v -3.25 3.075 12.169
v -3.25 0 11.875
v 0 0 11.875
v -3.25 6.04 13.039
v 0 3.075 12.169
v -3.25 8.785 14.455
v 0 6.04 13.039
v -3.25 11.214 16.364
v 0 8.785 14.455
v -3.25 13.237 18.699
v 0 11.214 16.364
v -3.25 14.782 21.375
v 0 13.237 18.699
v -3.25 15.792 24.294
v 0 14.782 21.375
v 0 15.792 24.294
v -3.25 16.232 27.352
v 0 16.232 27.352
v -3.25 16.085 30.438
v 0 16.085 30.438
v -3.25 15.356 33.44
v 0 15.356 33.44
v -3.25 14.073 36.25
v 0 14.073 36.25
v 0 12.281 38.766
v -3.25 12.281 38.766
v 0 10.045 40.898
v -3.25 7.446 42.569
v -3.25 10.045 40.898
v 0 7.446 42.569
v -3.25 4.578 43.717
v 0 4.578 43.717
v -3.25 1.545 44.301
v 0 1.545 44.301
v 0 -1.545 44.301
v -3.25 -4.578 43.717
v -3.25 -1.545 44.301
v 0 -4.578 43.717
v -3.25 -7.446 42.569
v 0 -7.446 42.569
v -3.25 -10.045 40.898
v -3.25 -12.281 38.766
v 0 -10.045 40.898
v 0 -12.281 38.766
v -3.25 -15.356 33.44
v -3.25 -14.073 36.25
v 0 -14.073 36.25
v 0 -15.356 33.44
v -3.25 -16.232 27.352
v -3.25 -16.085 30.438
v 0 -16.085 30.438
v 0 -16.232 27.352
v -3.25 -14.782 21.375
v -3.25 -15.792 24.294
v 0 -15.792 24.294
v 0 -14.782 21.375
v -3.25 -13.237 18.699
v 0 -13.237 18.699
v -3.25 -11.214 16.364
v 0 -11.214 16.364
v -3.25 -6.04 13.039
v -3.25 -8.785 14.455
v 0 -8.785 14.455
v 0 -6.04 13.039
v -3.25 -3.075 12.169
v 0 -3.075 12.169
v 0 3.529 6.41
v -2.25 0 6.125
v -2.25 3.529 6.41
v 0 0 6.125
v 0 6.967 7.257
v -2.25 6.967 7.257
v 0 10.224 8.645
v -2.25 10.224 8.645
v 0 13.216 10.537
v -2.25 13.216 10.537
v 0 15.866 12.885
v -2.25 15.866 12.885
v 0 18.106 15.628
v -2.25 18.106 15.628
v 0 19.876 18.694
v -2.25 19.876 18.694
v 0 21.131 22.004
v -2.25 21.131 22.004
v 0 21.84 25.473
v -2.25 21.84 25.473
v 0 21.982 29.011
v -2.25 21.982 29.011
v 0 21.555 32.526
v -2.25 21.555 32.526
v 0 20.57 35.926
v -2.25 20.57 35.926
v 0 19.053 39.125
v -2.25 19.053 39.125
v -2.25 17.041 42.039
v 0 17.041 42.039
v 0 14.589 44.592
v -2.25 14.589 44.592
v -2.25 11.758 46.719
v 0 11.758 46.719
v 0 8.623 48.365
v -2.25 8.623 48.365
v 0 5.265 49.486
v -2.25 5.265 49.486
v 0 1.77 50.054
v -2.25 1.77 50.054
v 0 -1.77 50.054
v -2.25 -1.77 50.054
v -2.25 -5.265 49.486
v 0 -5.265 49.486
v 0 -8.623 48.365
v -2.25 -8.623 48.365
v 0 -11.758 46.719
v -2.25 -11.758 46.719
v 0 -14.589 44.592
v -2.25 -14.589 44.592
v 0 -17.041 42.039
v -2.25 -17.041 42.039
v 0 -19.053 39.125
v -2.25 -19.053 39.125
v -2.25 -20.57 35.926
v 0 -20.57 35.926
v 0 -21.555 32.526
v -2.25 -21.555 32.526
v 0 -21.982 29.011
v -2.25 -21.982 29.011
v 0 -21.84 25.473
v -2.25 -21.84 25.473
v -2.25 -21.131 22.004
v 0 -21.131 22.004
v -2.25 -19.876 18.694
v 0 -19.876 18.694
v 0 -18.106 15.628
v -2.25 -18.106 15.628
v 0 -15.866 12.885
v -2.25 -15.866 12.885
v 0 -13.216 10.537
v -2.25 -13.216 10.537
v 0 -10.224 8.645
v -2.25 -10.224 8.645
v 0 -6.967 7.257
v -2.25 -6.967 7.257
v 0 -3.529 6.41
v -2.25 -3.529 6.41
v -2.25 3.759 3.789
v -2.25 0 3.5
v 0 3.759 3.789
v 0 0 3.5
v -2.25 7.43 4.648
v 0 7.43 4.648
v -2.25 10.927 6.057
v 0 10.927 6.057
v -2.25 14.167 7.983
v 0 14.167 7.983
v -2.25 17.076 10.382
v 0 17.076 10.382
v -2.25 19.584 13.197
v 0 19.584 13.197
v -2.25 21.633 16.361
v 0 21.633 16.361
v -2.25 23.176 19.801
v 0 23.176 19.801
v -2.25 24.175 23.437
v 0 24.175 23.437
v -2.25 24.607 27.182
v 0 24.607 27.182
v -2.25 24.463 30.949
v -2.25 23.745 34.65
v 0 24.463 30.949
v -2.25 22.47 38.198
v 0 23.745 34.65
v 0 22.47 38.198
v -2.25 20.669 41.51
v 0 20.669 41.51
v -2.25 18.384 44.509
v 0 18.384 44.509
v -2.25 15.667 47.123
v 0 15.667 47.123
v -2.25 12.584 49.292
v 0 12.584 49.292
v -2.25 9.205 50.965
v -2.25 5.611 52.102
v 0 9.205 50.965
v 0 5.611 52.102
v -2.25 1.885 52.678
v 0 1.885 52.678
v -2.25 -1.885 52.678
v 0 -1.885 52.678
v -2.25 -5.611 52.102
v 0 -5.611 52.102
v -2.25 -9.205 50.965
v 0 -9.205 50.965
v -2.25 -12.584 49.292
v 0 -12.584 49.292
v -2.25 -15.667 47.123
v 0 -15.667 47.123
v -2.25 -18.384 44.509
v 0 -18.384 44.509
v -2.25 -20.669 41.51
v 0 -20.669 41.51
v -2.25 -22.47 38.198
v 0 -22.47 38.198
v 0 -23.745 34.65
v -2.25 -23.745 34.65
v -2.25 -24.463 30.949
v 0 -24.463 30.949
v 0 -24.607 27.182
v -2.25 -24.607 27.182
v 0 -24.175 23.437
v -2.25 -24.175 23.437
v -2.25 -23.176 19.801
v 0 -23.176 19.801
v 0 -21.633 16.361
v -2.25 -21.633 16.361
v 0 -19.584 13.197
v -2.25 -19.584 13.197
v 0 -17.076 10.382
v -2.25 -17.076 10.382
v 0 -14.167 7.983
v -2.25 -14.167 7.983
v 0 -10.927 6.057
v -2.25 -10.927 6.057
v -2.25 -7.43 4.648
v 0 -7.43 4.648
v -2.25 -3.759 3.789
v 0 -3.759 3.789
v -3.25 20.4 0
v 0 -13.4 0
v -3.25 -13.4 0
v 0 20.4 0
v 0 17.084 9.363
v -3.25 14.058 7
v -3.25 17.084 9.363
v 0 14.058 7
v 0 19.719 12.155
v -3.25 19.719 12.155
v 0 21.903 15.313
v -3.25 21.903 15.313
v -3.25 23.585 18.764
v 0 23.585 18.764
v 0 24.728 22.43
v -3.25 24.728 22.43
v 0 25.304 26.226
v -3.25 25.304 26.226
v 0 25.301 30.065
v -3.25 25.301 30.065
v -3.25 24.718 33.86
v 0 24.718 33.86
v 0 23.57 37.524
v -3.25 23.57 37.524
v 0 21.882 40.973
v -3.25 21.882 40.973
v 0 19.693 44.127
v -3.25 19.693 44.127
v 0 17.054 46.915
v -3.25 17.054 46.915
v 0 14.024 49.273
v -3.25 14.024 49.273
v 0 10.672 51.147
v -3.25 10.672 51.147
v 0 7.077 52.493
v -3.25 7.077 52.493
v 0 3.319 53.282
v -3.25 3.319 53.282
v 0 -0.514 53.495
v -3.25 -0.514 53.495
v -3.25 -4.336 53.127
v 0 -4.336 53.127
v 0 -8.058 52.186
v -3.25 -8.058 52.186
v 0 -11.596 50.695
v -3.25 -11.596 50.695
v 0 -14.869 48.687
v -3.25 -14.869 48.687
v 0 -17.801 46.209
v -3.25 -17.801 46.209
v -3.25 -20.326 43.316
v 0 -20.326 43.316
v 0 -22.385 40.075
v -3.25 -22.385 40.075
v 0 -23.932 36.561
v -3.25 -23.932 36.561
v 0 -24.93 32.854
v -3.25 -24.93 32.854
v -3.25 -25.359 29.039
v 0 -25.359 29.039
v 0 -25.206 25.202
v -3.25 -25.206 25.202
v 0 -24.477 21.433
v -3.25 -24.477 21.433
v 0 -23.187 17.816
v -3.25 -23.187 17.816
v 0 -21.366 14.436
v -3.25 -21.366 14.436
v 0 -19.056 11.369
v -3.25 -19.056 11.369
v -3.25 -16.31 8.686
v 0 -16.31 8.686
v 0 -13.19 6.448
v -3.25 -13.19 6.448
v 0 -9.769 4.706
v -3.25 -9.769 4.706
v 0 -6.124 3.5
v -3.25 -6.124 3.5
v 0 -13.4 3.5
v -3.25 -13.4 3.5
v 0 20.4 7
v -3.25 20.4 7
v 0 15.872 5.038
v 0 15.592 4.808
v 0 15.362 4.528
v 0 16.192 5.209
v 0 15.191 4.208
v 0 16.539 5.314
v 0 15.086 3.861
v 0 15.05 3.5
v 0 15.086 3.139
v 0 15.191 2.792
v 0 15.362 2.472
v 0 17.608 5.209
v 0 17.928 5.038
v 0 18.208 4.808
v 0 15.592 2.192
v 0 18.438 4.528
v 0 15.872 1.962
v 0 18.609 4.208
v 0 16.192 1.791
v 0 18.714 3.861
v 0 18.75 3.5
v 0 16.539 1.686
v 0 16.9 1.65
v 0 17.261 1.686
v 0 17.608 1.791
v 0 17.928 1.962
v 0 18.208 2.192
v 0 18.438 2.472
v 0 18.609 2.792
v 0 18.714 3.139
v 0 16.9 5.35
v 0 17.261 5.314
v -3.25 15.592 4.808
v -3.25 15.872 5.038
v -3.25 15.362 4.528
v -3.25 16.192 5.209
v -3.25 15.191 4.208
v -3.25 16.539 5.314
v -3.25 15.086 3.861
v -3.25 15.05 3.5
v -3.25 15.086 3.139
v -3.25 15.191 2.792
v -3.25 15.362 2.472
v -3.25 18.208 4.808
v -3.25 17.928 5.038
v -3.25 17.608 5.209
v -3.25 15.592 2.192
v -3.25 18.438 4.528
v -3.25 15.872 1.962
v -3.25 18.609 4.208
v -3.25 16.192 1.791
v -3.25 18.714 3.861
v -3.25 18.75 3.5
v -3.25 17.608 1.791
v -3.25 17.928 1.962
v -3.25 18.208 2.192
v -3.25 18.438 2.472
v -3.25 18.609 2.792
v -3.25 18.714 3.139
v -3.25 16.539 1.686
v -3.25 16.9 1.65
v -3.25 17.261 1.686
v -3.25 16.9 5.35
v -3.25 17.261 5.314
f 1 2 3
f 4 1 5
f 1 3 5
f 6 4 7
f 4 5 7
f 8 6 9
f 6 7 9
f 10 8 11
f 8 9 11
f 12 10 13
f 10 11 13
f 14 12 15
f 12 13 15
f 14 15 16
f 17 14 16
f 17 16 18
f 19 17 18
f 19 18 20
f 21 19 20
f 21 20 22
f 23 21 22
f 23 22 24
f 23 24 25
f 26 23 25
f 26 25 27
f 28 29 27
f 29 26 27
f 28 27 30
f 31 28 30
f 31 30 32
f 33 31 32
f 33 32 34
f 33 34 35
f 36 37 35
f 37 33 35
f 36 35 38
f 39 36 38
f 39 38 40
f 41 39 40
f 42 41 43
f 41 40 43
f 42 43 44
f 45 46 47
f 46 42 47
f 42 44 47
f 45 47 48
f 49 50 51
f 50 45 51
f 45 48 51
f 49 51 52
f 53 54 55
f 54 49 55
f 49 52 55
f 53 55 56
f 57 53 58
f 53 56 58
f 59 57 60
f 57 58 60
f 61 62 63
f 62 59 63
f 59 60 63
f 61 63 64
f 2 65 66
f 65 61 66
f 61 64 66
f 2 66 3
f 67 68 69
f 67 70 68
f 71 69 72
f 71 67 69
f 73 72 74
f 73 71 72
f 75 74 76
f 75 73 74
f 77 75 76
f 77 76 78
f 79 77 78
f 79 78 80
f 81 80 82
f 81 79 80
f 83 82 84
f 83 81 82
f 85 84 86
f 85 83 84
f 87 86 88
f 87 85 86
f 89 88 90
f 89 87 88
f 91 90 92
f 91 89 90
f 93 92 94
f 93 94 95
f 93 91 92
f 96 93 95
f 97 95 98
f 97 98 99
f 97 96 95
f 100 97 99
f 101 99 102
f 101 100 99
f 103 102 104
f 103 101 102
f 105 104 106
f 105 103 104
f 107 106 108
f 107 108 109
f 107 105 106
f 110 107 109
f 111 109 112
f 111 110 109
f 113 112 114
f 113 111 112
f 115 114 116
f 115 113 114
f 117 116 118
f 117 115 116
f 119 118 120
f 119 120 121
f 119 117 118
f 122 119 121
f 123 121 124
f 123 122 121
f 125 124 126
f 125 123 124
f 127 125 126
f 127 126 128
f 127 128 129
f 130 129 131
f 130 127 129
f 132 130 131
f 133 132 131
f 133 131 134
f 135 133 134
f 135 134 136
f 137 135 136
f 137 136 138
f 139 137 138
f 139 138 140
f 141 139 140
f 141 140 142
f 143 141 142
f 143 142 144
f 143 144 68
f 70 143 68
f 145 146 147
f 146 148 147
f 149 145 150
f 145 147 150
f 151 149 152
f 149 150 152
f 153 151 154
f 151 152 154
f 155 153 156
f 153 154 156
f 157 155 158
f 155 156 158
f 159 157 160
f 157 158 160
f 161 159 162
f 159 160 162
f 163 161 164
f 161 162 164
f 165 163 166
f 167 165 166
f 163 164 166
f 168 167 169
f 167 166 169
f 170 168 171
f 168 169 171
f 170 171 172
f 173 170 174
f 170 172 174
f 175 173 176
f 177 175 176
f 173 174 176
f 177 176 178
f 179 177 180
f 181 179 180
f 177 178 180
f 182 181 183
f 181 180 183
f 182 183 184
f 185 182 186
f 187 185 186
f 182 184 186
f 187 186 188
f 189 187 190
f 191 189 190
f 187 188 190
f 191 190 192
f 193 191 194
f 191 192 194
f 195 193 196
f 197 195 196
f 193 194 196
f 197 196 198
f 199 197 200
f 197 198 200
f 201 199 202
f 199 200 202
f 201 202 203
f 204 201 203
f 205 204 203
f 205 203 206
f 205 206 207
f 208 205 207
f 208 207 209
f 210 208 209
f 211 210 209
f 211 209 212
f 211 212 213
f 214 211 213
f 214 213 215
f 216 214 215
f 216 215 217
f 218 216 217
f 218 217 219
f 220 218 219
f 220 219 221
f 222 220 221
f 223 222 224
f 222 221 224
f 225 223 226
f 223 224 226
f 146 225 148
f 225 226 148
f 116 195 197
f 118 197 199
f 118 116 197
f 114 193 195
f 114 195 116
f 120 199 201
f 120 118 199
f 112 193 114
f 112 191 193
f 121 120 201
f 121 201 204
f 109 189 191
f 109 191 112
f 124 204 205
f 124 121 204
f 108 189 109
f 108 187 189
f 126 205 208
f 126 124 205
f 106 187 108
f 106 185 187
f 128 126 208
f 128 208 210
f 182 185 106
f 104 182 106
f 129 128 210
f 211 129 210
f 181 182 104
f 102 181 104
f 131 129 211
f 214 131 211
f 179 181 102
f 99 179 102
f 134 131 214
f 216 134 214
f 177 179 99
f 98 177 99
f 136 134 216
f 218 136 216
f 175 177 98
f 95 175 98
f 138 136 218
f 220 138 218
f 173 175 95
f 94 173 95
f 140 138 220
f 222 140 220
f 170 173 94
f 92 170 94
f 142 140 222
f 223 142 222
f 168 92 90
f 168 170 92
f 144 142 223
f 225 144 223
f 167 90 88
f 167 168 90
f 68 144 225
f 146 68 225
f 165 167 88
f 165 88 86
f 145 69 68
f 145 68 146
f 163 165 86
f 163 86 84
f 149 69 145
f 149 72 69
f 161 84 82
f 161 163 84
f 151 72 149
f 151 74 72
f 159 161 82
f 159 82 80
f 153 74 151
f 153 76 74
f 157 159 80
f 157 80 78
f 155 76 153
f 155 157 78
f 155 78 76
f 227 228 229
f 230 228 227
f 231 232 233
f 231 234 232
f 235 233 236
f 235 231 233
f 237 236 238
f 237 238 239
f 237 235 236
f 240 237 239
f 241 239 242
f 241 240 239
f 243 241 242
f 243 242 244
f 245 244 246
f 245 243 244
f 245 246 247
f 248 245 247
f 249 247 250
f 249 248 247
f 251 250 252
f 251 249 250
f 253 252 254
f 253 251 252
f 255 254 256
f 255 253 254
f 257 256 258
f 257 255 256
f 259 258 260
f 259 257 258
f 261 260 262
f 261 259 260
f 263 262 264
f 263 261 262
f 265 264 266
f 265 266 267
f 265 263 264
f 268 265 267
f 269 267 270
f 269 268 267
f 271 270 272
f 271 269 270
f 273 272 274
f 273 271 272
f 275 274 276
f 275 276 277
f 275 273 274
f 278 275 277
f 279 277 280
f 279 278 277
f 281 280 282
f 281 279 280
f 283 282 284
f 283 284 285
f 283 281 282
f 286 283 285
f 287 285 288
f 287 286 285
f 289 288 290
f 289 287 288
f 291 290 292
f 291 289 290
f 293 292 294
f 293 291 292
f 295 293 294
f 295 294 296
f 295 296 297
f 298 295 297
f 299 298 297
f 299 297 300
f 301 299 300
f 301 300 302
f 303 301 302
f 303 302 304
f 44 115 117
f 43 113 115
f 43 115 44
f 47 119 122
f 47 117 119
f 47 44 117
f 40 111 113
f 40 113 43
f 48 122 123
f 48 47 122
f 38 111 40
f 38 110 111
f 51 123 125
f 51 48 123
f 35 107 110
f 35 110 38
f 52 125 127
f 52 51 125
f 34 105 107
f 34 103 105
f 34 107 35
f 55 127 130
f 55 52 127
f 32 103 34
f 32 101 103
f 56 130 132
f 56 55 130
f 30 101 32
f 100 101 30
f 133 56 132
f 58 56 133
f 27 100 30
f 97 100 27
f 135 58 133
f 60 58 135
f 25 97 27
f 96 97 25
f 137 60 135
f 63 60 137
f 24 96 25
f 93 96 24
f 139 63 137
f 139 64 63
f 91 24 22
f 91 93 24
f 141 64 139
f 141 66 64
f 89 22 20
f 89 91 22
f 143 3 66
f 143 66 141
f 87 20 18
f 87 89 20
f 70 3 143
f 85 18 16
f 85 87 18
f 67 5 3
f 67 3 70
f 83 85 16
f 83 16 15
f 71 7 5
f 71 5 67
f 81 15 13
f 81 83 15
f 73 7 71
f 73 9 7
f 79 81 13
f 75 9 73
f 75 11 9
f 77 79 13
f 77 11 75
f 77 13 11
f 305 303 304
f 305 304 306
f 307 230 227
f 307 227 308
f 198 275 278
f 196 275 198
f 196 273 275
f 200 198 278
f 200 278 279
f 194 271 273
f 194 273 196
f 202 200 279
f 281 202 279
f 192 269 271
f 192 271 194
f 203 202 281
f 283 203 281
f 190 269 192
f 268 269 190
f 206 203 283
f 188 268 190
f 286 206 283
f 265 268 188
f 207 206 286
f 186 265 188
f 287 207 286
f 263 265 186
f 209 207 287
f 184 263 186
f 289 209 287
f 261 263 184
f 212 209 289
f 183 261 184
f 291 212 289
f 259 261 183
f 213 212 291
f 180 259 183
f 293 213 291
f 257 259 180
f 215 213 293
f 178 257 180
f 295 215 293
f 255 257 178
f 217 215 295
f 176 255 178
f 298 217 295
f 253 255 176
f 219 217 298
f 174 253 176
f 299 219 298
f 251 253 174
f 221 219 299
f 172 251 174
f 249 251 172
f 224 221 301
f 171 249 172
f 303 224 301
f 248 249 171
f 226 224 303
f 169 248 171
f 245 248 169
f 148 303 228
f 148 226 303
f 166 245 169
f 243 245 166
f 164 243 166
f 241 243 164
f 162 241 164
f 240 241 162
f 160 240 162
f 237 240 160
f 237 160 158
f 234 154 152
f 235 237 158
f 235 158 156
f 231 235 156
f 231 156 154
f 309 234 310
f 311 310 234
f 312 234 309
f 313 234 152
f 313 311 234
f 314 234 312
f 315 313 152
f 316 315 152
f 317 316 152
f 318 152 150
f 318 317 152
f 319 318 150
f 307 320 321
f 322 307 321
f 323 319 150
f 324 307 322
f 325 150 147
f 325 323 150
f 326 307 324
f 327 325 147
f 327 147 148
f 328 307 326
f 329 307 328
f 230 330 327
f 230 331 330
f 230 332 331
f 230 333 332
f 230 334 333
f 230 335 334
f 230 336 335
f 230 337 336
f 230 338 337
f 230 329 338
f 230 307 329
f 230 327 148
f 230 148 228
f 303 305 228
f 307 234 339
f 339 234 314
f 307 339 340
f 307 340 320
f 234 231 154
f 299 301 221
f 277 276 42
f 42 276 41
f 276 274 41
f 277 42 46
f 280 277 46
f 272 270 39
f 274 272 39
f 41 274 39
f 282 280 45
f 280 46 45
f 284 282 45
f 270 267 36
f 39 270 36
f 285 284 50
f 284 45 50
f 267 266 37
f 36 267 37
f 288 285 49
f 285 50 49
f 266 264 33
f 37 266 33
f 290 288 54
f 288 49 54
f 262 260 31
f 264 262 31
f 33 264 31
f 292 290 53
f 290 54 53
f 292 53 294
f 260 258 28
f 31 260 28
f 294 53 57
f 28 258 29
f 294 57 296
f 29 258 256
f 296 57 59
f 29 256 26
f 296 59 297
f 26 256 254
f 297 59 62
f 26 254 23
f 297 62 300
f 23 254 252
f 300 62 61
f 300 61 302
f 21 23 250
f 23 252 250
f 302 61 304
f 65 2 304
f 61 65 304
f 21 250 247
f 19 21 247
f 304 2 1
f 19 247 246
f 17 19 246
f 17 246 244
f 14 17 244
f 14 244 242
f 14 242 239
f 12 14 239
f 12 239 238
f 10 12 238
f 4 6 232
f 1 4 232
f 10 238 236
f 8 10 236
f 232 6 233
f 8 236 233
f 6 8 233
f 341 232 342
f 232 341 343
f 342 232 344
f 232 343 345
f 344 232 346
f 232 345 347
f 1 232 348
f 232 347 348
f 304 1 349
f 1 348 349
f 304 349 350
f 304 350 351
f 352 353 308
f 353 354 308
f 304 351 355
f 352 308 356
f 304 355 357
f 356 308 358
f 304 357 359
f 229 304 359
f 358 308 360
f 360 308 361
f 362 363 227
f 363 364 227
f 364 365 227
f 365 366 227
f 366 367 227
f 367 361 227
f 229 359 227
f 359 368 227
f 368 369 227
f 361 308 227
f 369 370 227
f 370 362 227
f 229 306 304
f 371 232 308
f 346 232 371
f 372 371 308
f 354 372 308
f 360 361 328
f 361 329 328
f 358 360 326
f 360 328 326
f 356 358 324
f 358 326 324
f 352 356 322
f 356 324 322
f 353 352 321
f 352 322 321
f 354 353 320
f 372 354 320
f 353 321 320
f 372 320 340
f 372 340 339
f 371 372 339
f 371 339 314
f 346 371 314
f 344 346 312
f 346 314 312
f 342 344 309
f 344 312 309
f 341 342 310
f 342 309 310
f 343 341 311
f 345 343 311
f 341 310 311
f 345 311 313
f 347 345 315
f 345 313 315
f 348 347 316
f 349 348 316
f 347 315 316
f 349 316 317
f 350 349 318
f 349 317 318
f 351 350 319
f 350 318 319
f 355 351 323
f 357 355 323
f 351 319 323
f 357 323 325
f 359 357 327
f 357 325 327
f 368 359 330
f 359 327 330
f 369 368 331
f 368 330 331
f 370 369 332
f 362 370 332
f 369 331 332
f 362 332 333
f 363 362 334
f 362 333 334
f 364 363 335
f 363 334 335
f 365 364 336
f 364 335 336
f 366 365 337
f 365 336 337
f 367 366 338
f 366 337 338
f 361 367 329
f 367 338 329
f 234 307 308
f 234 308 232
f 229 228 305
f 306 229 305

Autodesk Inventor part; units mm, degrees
ref_plane "YZ Plane" through (0, 0, 0) normal (1, 0, 0) x (0, 1, 0)
ref_plane "XZ Plane" through (0, 0, 0) normal (0, 1, 0) x (-1, 0, 0)
ref_plane "XY Plane" through (0, 0, 0) normal (0, 0, 1) x (1, 0, 0)
sketch "Sketch2: RFID holder" plane through (0, 0, 0) normal (1, 0, 0) x (0, 0, -1)
  circle A0 centre (-28.125, 0) radius 16.25
  circle A1 centre (-28.125, 0) radius 22
  circle A2 centre (-28.125, 0) radius 24.625
  circle A3 centre (-28.125, 0) radius 25.375
  line L0 (-28.125, 1.5) -> (0, 1.5)
  line L1 (-28.125, -1.5) -> (0, -1.5)
  line L2 (0, -13.4) -> (0, 13.4)
  line L3 (0, -13.4) -> (-3.5, -13.4)
  line L4 (0, 13.4) -> (-3.5, 13.4)
  line L5 (-3.5, 13.4) -> (-3.5, -13.4)
  line L6 (-28.125, 1.5) -> (-28.125, -1.5) construction
  line L7 (-2.75, 13.4) -> (-2.75, -13.4) construction
  line L8 (-1, 13.4) -> (-1, -13.4)
  line L9 (-3.5, -6.1237) -> (0, -6.1237)
  point P0 (-2.7944, -1.5)
  point P1 (-2.7944, 1.5)
  point P2 (0, 0)
  point P3 (-6.1762, -1.5)
  point P4 (-6.1762, 1.5)
  point P5 (-3.5457, -1.5)
  point P6 (-3.5457, 1.5)
  point P7 (-3.5, -1.5)
  point P8 (-3.5, 1.5)
  point P9 (-3.5, 0)
  point P10 (0, 0)
  point P11 (-3.5, 6.1237)
  point P12 (-3.5, -6.1237)
  point P13 (-1, -1.5)
  point P14 (-1, 1.5)
  dimension "d48" = 50.75
  dimension "RFID_coil_ID" = 44
  dimension "RFID_coil_OD" = 49.25
  dimension "d7" = 0.75
  dimension "d49" = 3
  dimension "d54" = 1.5
  dimension "d57" = 0.75
  dimension "d58" = 26.8
  dimension "d59" = 3.5
  dimension "d60" = 32.5
  dimension "dist_for_RFID_wire" = 2.5
sketch "Sketch8: M3 through hole" plane through (0, 0, 0) normal (1, 0, 0) x (0, 1, 0)
  line L0 (20.4, 7) -> (13.4, 7)
  line L1 (13.4, 7) -> (13.4, 0)
  line L2 (13.4, 0) -> (20.4, 0)
  line L3 (20.4, 0) -> (20.4, 7)
  circle A0 centre (16.9, 3.5) radius 1.85
  circle A1 centre (0, 28.125) radius 25.375 projected
  line L4 (13.4, 3.5) -> (-13.4, 3.5) projected
  line L5 (13.4, 0) -> (13.4, 3.5) construction
  point P0 (0, 0)
  point P1 (20.4, 3.5)
  point P2 (16.9, 7)
  point P3 (6.1237, 3.5)
  point P4 (14.0579, 7)
  dimension "d63" = 3.7
  dimension "d66" = 7
  dimension "d67" = 7
extrude "Ex2: RFID holder base" add sketch "Sketch2: RFID holder" against normal blind 3.25 contours A0 L0 A1 L1 | A0 L1 A1 L0 | L0 A2 L1 A1 | A1 L1 A2 L0 | L0 L5 A2 | A2 L1 L5 A3 L0 | A2 L5 L1 | L5 L0 A3 L1 | L5 A3 L0 | L1 A3 L5 | L0 L8 L1 A3 | A3 L5 L4 L8 L0 | L1 L8 L9 A3 | L9 L8 L3 L5 | L8 L4 L2 L0 | L0 L2 L1 L8 | L1 L2 L9 L8 | L9 L2 L3 L8
extrude "Ex3: RFID inset" cut sketch "Sketch2: RFID holder" against normal blind 2.25 contours L0 A2 L1 A1 | A1 L1 A2 L0
extrude "Ex4: RFID wire cutout" [suppressed]
extrude "Ex: M3 through hole" add sketch "Sketch8: M3 through hole" against normal up to surface (3.25 mm away) contours L3 L2 L1 A1 L0 | L1 L4 A1
equation "\"d54\" = 0.5 * d49"
properties part number "RFID_holder_coil_01" material "PLA Black"
